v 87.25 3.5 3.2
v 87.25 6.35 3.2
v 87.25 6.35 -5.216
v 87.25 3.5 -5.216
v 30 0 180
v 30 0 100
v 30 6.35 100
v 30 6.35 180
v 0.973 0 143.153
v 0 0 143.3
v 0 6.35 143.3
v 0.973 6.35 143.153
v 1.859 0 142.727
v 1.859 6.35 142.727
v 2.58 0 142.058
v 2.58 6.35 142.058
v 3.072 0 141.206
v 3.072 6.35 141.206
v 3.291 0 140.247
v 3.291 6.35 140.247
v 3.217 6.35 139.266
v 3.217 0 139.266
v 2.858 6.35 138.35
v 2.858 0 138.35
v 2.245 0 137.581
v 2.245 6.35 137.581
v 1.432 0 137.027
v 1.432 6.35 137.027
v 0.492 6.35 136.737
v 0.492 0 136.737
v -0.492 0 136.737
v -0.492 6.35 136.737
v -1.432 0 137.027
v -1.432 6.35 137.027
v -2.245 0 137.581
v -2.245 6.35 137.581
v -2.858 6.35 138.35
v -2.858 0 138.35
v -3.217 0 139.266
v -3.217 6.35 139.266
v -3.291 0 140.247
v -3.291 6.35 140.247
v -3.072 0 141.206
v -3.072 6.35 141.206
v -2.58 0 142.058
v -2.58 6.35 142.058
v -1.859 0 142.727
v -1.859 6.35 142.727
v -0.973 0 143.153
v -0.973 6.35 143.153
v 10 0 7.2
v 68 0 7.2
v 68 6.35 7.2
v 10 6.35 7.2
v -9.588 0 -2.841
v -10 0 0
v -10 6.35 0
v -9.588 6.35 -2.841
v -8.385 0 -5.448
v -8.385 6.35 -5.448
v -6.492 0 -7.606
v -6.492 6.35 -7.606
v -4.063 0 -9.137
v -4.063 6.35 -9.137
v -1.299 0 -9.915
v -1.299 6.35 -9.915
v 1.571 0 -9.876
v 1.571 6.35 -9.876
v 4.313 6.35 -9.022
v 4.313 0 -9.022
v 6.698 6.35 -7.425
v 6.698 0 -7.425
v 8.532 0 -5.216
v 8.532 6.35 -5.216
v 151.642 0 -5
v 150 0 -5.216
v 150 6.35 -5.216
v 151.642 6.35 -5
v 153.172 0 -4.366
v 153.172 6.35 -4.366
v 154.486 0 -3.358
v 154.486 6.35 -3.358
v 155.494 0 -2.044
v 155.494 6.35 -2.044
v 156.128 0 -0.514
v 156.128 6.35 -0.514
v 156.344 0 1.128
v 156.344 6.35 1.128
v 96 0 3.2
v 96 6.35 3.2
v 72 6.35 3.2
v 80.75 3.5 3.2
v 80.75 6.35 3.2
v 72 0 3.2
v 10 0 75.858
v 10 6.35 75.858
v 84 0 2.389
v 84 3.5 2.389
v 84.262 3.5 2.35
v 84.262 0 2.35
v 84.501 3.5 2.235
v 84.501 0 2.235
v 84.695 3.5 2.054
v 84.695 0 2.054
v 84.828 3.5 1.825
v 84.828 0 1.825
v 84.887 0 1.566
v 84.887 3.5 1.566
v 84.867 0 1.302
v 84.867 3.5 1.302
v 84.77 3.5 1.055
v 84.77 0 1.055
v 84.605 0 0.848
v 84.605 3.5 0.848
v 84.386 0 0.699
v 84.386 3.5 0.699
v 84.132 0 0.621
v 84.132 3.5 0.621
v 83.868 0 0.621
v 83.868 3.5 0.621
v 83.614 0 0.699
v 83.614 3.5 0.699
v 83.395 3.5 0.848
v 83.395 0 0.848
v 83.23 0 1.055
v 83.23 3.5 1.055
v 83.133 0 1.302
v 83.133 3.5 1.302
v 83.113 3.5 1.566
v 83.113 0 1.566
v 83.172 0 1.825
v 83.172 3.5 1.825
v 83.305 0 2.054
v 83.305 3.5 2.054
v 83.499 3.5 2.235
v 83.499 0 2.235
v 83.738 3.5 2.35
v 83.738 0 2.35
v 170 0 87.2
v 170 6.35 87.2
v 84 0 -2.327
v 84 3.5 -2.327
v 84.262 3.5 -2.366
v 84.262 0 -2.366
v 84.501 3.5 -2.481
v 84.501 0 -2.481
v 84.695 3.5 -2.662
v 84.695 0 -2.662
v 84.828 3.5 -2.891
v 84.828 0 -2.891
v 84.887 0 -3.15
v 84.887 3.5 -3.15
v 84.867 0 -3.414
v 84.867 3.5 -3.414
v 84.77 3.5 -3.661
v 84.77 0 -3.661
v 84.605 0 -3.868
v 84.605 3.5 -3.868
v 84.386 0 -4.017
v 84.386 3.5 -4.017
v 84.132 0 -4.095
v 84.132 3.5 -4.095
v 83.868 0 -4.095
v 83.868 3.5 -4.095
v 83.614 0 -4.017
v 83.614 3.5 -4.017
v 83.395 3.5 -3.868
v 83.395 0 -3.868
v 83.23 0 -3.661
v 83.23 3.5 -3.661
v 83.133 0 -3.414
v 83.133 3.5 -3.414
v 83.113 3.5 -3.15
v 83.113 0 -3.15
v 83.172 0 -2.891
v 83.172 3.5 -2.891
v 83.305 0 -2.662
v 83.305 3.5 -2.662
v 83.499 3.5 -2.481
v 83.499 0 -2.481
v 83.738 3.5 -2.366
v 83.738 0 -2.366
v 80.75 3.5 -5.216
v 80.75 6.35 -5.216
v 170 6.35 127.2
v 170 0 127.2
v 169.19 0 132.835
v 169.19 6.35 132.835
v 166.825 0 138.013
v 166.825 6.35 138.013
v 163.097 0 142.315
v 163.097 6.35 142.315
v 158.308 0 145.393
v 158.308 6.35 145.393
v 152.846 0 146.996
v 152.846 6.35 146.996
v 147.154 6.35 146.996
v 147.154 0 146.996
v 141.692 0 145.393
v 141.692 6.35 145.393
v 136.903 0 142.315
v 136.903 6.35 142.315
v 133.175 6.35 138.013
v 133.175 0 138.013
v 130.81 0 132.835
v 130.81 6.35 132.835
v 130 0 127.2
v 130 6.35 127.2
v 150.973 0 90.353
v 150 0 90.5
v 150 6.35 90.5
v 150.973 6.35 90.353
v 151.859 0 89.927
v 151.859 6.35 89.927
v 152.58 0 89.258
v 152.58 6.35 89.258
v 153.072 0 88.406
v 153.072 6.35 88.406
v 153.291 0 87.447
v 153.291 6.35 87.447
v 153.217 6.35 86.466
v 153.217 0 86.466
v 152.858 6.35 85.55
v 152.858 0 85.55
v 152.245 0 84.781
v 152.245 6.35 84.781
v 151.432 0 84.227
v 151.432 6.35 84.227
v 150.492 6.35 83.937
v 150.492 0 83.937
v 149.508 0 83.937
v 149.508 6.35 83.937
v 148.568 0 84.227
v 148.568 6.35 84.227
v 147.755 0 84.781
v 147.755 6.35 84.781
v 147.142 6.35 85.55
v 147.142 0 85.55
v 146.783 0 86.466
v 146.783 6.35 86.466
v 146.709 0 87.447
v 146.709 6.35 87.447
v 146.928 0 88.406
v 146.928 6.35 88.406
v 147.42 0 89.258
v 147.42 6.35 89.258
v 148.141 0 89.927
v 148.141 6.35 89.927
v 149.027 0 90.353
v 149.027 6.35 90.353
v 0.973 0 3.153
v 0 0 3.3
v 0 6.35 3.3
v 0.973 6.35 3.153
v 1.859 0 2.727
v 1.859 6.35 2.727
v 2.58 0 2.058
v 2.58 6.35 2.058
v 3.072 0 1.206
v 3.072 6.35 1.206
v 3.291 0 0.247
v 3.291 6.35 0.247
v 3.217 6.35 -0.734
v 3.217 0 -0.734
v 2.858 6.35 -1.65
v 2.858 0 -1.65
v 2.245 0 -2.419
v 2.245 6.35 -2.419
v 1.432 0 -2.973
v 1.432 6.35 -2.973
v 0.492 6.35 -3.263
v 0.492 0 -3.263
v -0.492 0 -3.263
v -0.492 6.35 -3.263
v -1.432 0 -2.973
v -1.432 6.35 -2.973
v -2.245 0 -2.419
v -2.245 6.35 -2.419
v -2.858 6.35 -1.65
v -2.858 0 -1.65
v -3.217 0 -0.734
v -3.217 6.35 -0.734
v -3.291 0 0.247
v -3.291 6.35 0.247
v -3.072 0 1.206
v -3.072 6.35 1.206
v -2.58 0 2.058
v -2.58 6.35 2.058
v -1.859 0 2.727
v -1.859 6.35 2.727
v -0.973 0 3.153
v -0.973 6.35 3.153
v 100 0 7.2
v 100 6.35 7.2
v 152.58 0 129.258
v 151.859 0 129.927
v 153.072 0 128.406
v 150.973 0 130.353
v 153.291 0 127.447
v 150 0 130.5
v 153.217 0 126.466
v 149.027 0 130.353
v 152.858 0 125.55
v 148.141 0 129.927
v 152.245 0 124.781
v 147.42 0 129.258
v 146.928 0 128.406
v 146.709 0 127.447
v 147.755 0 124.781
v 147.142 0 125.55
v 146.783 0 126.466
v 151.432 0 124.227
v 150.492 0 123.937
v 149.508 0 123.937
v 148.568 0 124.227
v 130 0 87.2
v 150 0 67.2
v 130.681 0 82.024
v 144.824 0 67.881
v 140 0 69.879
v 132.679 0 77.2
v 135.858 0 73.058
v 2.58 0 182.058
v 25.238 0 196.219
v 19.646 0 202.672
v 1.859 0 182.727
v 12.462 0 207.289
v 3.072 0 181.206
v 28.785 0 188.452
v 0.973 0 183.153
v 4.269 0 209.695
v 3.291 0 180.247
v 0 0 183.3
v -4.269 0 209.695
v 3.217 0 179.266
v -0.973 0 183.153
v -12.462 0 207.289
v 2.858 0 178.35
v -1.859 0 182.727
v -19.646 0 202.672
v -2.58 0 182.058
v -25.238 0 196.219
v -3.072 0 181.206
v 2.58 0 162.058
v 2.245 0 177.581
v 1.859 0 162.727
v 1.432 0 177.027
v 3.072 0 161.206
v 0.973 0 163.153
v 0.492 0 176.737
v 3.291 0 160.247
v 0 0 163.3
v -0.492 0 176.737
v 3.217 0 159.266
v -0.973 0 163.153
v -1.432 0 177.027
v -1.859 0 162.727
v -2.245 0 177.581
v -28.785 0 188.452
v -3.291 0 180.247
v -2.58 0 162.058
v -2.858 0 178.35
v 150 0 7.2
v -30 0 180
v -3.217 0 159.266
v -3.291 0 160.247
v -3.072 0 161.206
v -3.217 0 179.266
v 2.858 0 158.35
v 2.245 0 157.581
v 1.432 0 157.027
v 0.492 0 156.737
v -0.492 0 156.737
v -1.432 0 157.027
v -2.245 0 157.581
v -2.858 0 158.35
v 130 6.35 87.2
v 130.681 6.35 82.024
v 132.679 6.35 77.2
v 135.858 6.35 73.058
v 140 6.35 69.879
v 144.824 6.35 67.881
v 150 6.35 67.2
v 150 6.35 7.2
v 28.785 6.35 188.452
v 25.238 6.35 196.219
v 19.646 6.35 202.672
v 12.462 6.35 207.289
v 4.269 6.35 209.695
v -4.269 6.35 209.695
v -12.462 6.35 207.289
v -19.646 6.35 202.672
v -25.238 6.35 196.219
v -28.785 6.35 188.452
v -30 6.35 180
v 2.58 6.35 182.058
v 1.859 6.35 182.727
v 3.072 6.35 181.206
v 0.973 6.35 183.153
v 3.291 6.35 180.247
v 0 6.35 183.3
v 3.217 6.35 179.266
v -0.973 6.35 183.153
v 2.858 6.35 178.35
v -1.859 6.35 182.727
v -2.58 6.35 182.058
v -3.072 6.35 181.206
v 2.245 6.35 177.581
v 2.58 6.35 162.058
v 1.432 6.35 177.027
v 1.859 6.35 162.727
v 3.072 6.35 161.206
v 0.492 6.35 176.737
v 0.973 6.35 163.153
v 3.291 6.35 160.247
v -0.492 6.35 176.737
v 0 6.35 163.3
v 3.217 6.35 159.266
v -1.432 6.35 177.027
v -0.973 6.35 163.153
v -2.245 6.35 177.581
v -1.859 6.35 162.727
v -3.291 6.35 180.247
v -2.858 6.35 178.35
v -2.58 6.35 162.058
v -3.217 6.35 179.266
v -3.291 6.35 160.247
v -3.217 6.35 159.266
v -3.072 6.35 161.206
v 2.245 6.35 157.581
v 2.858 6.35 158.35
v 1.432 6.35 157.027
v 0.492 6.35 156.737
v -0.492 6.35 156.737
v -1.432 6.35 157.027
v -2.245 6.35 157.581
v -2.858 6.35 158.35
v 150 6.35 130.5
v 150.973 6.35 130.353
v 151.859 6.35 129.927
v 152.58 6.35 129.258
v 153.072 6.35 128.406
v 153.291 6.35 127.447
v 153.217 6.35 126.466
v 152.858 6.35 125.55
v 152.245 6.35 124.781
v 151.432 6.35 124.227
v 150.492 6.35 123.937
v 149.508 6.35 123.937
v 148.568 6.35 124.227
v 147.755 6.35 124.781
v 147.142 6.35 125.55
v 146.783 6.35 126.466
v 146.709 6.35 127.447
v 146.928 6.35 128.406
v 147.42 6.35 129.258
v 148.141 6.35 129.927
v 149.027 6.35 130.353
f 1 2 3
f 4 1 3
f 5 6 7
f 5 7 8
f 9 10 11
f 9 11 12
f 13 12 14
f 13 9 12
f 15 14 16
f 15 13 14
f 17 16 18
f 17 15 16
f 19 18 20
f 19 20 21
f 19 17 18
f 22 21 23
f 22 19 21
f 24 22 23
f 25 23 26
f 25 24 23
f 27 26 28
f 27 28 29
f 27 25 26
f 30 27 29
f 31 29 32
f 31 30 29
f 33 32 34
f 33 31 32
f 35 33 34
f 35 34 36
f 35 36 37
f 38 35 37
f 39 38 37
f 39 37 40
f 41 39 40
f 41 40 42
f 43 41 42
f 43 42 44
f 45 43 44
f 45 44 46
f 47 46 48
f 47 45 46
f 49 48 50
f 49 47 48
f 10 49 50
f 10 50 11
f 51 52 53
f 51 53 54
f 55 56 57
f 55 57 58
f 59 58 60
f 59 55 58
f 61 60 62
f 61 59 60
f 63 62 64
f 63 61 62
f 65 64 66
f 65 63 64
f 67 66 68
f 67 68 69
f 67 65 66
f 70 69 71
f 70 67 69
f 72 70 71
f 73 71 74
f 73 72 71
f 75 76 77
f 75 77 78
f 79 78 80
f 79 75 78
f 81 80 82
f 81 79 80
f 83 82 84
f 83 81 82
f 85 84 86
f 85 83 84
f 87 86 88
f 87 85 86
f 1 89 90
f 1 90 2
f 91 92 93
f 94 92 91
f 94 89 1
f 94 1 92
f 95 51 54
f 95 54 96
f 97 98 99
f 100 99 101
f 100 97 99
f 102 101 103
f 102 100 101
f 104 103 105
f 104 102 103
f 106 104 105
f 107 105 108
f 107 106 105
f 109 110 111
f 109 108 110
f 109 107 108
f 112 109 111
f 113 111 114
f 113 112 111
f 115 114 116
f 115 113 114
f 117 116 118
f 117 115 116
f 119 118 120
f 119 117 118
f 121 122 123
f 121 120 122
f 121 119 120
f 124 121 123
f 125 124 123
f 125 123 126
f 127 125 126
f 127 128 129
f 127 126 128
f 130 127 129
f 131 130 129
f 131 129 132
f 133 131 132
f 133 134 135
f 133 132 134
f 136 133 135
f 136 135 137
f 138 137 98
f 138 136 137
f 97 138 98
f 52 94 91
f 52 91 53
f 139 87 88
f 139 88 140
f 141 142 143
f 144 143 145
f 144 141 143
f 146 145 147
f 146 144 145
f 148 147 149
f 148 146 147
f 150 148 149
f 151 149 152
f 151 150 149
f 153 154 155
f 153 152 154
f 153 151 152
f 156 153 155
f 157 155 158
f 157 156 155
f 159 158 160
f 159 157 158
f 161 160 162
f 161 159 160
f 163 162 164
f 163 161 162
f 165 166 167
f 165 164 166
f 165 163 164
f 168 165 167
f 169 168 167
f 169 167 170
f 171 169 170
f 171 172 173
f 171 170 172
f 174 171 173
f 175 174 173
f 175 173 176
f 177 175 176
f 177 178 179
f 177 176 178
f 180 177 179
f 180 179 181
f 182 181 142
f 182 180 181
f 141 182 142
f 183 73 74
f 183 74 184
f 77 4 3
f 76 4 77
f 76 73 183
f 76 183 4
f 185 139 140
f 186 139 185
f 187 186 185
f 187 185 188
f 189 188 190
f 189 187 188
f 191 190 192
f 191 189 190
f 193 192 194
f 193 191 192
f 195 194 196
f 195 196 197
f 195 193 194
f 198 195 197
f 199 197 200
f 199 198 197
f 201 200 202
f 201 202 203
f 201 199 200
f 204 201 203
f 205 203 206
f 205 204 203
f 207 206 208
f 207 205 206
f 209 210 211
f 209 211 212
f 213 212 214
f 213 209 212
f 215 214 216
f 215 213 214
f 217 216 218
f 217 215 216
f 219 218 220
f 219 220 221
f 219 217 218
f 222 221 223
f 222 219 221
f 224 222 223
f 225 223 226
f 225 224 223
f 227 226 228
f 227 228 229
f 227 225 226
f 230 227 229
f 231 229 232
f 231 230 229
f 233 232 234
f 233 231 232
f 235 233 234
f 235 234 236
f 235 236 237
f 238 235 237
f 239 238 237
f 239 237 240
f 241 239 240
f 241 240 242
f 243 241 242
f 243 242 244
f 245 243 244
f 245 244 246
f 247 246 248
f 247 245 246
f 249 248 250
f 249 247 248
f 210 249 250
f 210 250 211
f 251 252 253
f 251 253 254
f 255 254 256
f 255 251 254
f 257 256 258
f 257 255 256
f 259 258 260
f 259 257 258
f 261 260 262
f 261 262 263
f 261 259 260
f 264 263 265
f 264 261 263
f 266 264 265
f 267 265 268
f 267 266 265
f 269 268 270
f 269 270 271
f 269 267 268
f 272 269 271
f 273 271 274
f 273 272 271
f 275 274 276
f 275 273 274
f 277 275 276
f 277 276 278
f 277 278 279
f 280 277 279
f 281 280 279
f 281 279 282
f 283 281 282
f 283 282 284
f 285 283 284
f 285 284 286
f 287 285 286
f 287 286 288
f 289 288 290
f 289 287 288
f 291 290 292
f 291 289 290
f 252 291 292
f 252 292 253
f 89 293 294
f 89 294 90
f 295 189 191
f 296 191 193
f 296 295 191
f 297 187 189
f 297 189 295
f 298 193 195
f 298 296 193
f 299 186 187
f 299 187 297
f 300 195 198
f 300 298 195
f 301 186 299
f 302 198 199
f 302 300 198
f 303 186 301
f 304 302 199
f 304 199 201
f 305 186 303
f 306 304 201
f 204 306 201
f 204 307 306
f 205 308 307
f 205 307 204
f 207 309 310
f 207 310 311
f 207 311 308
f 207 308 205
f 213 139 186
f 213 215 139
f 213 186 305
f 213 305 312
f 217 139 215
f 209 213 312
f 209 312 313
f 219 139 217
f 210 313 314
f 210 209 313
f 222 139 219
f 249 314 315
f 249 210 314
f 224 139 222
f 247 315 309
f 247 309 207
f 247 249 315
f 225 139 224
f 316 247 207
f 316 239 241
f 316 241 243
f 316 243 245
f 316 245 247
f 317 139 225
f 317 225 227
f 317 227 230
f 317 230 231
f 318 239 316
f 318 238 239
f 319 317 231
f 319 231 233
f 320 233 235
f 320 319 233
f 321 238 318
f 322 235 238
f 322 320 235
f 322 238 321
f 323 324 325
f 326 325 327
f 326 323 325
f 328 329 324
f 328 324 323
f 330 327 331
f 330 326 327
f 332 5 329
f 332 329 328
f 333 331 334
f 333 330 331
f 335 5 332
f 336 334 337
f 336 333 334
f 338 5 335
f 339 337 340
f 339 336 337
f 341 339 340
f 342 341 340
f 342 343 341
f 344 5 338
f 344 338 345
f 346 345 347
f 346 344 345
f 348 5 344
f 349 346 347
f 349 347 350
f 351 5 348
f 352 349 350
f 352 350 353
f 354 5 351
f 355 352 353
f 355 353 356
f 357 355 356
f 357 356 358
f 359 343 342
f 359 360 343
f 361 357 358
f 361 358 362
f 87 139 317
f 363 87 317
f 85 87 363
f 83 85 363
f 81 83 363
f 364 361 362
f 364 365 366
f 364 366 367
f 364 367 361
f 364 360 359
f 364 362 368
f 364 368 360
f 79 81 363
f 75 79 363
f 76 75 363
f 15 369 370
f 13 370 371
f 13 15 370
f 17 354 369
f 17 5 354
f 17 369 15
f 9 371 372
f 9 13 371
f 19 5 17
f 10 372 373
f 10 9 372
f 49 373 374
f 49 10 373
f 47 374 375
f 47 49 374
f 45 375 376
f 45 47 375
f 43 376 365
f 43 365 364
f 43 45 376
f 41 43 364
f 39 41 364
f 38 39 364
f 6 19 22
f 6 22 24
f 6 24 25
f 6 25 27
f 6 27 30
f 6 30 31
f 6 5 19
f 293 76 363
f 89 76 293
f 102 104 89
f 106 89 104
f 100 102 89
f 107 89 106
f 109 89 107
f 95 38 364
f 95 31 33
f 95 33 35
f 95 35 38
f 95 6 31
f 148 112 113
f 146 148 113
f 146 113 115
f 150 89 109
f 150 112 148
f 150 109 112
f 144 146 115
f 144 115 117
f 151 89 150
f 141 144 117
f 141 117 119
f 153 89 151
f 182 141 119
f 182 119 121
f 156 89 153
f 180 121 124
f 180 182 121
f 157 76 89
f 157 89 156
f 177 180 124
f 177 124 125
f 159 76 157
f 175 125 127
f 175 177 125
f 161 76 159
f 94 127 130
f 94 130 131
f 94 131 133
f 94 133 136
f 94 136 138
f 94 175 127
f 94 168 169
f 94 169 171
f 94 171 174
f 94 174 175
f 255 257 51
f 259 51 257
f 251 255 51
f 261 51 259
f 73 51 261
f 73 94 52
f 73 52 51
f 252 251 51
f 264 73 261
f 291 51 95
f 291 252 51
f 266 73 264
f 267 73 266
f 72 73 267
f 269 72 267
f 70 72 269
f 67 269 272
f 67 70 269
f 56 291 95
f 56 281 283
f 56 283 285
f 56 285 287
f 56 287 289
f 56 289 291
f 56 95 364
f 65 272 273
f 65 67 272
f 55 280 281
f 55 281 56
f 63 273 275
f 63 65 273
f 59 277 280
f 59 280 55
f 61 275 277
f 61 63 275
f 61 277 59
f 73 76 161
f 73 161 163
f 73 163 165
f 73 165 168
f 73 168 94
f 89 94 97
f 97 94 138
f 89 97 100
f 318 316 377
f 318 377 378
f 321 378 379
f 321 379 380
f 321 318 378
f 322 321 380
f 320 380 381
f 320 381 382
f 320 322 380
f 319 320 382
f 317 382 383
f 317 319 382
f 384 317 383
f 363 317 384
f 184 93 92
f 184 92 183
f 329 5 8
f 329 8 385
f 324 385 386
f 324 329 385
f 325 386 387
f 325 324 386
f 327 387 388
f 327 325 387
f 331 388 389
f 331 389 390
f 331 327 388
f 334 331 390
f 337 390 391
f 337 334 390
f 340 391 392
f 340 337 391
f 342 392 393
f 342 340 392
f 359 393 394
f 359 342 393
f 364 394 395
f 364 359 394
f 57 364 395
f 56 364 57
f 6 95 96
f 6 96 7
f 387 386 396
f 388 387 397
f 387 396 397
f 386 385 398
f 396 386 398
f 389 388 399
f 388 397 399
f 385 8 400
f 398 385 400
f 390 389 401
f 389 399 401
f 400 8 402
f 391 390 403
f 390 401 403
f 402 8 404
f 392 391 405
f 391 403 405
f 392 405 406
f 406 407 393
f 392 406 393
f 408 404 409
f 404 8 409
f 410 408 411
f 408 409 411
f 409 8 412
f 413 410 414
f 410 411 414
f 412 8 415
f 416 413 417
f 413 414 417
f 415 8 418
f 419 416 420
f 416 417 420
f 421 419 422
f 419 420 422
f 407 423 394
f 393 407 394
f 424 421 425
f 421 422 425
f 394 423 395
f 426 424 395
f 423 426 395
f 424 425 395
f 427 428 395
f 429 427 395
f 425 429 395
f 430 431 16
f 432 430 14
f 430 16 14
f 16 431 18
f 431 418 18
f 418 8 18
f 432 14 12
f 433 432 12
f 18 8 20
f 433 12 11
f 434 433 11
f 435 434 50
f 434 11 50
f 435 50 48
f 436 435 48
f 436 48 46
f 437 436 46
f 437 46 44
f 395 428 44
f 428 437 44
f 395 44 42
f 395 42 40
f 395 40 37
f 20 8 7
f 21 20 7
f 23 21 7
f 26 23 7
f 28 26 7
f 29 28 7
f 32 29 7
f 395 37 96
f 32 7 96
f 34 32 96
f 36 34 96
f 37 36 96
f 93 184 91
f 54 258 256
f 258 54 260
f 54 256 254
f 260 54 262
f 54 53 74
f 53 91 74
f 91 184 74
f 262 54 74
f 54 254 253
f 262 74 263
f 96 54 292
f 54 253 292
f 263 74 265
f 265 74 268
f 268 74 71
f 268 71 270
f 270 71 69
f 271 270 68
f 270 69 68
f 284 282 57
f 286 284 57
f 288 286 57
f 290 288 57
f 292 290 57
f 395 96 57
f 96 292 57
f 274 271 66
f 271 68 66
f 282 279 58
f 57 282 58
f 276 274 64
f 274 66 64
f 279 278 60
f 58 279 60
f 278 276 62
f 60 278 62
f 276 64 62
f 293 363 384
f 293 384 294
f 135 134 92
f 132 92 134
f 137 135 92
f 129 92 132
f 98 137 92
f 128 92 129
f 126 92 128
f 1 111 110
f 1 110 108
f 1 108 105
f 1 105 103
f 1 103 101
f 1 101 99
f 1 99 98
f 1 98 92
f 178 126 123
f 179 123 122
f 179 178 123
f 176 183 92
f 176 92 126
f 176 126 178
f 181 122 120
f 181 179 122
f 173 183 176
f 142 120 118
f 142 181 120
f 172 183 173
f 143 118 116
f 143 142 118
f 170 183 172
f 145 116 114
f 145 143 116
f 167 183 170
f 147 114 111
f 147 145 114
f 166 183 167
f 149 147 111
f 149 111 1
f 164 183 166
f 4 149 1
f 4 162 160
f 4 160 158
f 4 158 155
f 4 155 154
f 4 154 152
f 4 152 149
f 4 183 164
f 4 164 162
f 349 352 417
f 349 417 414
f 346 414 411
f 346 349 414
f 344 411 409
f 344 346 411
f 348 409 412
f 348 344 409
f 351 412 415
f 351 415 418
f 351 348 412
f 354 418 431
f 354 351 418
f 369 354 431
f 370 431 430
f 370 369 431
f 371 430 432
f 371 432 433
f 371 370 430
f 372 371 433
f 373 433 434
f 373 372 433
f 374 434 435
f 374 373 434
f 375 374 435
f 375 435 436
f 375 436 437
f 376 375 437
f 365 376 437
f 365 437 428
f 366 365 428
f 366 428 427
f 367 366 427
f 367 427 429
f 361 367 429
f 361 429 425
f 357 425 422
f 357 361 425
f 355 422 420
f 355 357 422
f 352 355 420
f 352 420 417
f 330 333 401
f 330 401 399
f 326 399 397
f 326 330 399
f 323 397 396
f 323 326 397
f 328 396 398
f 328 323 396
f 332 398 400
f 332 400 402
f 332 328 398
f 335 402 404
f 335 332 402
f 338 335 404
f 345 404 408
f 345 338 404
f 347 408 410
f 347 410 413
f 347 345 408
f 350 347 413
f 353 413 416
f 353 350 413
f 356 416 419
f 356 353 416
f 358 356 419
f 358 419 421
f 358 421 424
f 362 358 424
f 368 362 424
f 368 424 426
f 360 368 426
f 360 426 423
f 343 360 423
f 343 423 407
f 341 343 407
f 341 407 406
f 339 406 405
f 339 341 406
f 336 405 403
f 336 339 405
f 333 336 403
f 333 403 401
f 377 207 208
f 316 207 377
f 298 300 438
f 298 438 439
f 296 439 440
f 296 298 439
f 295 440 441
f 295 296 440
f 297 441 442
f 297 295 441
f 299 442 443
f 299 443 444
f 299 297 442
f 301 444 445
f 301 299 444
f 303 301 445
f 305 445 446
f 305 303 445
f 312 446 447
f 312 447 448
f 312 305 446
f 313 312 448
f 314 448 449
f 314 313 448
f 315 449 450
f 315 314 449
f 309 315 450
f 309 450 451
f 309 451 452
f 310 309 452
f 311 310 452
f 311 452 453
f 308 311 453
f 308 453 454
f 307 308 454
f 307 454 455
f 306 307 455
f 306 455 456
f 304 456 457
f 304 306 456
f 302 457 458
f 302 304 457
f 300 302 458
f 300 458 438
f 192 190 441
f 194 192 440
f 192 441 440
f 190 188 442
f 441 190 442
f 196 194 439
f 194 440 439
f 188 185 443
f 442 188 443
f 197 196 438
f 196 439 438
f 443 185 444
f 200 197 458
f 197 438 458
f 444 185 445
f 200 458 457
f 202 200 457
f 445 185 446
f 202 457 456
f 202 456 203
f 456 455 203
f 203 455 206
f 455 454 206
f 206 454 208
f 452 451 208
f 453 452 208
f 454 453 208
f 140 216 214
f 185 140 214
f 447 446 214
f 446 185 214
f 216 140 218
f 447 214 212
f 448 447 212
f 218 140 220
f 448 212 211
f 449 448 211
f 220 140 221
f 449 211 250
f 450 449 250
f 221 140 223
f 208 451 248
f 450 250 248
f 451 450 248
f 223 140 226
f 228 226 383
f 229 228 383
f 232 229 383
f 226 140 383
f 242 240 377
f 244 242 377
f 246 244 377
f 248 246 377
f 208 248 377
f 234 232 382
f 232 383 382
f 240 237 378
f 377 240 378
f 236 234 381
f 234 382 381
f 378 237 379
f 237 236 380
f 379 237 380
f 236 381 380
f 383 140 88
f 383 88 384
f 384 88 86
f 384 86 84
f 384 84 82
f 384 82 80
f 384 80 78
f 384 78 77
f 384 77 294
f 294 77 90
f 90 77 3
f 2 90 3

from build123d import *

# Parameters (mm, degrees)
SKETCH1_R           = 3.3
SKETCH1_R_2         = 0.889
BOSS_EXTRUDE1_DEPTH = 6.35
SKETCH3_W           = 6.5
SKETCH3_H           = 10.724019234
CUT_EXTRUDE2_DEPTH  = 2.85


with BuildPart() as part:
    # Sketch1 → Boss-Extrude1 (new body)
    with BuildSketch(Plane(origin=(0, 0, 0), x_dir=(1, 0, 0), z_dir=(0, 1, 0))):
        with BuildLine():
            Line((10, -7.2), (10, -75.857864376))
            Line((10, -75.857864376), (30, -100))
            Line((30, -100), (30, -180))
            ThreePointArc((30, -180), (0, -210), (-30, -180))
            Line((-30, -180), (-10, 0))
            ThreePointArc((-10, 0), (-2.709235972, 9.626008542), (8.532008089, 5.215825723))
            Line((8.532008089, 5.215825723), (75, 5.215825723))
            Line((75, 5.215825723), (150, 5.215825723))
            ThreePointArc((150, 5.215825723), (154.485699703, 3.357788069), (156.343737357, -1.127911635))
            Line((156.343737357, -1.127911635), (170, -87.2))
            Line((170, -87.2), (170, -127.2))
            ThreePointArc((170, -127.2), (150, -147.2), (130, -127.2))
            Line((130, -127.2), (130, -87.2))
            ThreePointArc((130, -87.2), (135.857864376, -73.057864376), (150, -67.2))
            Line((150, -67.2), (150, -7.2))
            Line((150, -7.2), (100, -7.2))
            Line((100, -7.2), (96, -3.2))
            Line((96, -3.2), (84, -3.2))
            Line((84, -3.2), (72, -3.2))
            Line((72, -3.2), (68, -7.2))
            Line((68, -7.2), (59, -7.2))
            Line((59, -7.2), (10, -7.2))
        make_face()
        with Locations(Location((0, 0, 0), (0, 0, 270))):
            Circle(SKETCH1_R, mode=Mode.SUBTRACT)
        with Locations(Location((0, -180, 0), (0, 0, 270))):
            Circle(SKETCH1_R, mode=Mode.SUBTRACT)
        with Locations(Location((150, -87.2, 0), (0, 0, 270))):
            Circle(SKETCH1_R, mode=Mode.SUBTRACT)
        with Locations(Location((84, -1.5, 0), (0, 0, 270))):
            Circle(SKETCH1_R_2, mode=Mode.SUBTRACT)
        with Locations(Location((84, 3.216, 0), (0, 0, 270))):
            Circle(SKETCH1_R_2, mode=Mode.SUBTRACT)
        with Locations(Location((150, -127.2, 0), (0, 0, 270))):
            Circle(SKETCH1_R, mode=Mode.SUBTRACT)
        with Locations(Location((0, -160, 0), (0, 0, 270))):
            Circle(SKETCH1_R, mode=Mode.SUBTRACT)
        with Locations(Location((0, -140, 0), (0, 0, 270))):
            Circle(SKETCH1_R, mode=Mode.SUBTRACT)
    extrude(amount=BOSS_EXTRUDE1_DEPTH)

    # Sketch3 → Cut-Extrude2 (cut)
    with BuildSketch(Plane(origin=(0, 6.35, 0), x_dir=(1, 0, 0), z_dir=(0, 1, 0))):
        with Locations((84, 0.476239432)):
            Rectangle(SKETCH3_W, SKETCH3_H)
    extrude(amount=-CUT_EXTRUDE2_DEPTH, mode=Mode.SUBTRACT)


solid = part.part
